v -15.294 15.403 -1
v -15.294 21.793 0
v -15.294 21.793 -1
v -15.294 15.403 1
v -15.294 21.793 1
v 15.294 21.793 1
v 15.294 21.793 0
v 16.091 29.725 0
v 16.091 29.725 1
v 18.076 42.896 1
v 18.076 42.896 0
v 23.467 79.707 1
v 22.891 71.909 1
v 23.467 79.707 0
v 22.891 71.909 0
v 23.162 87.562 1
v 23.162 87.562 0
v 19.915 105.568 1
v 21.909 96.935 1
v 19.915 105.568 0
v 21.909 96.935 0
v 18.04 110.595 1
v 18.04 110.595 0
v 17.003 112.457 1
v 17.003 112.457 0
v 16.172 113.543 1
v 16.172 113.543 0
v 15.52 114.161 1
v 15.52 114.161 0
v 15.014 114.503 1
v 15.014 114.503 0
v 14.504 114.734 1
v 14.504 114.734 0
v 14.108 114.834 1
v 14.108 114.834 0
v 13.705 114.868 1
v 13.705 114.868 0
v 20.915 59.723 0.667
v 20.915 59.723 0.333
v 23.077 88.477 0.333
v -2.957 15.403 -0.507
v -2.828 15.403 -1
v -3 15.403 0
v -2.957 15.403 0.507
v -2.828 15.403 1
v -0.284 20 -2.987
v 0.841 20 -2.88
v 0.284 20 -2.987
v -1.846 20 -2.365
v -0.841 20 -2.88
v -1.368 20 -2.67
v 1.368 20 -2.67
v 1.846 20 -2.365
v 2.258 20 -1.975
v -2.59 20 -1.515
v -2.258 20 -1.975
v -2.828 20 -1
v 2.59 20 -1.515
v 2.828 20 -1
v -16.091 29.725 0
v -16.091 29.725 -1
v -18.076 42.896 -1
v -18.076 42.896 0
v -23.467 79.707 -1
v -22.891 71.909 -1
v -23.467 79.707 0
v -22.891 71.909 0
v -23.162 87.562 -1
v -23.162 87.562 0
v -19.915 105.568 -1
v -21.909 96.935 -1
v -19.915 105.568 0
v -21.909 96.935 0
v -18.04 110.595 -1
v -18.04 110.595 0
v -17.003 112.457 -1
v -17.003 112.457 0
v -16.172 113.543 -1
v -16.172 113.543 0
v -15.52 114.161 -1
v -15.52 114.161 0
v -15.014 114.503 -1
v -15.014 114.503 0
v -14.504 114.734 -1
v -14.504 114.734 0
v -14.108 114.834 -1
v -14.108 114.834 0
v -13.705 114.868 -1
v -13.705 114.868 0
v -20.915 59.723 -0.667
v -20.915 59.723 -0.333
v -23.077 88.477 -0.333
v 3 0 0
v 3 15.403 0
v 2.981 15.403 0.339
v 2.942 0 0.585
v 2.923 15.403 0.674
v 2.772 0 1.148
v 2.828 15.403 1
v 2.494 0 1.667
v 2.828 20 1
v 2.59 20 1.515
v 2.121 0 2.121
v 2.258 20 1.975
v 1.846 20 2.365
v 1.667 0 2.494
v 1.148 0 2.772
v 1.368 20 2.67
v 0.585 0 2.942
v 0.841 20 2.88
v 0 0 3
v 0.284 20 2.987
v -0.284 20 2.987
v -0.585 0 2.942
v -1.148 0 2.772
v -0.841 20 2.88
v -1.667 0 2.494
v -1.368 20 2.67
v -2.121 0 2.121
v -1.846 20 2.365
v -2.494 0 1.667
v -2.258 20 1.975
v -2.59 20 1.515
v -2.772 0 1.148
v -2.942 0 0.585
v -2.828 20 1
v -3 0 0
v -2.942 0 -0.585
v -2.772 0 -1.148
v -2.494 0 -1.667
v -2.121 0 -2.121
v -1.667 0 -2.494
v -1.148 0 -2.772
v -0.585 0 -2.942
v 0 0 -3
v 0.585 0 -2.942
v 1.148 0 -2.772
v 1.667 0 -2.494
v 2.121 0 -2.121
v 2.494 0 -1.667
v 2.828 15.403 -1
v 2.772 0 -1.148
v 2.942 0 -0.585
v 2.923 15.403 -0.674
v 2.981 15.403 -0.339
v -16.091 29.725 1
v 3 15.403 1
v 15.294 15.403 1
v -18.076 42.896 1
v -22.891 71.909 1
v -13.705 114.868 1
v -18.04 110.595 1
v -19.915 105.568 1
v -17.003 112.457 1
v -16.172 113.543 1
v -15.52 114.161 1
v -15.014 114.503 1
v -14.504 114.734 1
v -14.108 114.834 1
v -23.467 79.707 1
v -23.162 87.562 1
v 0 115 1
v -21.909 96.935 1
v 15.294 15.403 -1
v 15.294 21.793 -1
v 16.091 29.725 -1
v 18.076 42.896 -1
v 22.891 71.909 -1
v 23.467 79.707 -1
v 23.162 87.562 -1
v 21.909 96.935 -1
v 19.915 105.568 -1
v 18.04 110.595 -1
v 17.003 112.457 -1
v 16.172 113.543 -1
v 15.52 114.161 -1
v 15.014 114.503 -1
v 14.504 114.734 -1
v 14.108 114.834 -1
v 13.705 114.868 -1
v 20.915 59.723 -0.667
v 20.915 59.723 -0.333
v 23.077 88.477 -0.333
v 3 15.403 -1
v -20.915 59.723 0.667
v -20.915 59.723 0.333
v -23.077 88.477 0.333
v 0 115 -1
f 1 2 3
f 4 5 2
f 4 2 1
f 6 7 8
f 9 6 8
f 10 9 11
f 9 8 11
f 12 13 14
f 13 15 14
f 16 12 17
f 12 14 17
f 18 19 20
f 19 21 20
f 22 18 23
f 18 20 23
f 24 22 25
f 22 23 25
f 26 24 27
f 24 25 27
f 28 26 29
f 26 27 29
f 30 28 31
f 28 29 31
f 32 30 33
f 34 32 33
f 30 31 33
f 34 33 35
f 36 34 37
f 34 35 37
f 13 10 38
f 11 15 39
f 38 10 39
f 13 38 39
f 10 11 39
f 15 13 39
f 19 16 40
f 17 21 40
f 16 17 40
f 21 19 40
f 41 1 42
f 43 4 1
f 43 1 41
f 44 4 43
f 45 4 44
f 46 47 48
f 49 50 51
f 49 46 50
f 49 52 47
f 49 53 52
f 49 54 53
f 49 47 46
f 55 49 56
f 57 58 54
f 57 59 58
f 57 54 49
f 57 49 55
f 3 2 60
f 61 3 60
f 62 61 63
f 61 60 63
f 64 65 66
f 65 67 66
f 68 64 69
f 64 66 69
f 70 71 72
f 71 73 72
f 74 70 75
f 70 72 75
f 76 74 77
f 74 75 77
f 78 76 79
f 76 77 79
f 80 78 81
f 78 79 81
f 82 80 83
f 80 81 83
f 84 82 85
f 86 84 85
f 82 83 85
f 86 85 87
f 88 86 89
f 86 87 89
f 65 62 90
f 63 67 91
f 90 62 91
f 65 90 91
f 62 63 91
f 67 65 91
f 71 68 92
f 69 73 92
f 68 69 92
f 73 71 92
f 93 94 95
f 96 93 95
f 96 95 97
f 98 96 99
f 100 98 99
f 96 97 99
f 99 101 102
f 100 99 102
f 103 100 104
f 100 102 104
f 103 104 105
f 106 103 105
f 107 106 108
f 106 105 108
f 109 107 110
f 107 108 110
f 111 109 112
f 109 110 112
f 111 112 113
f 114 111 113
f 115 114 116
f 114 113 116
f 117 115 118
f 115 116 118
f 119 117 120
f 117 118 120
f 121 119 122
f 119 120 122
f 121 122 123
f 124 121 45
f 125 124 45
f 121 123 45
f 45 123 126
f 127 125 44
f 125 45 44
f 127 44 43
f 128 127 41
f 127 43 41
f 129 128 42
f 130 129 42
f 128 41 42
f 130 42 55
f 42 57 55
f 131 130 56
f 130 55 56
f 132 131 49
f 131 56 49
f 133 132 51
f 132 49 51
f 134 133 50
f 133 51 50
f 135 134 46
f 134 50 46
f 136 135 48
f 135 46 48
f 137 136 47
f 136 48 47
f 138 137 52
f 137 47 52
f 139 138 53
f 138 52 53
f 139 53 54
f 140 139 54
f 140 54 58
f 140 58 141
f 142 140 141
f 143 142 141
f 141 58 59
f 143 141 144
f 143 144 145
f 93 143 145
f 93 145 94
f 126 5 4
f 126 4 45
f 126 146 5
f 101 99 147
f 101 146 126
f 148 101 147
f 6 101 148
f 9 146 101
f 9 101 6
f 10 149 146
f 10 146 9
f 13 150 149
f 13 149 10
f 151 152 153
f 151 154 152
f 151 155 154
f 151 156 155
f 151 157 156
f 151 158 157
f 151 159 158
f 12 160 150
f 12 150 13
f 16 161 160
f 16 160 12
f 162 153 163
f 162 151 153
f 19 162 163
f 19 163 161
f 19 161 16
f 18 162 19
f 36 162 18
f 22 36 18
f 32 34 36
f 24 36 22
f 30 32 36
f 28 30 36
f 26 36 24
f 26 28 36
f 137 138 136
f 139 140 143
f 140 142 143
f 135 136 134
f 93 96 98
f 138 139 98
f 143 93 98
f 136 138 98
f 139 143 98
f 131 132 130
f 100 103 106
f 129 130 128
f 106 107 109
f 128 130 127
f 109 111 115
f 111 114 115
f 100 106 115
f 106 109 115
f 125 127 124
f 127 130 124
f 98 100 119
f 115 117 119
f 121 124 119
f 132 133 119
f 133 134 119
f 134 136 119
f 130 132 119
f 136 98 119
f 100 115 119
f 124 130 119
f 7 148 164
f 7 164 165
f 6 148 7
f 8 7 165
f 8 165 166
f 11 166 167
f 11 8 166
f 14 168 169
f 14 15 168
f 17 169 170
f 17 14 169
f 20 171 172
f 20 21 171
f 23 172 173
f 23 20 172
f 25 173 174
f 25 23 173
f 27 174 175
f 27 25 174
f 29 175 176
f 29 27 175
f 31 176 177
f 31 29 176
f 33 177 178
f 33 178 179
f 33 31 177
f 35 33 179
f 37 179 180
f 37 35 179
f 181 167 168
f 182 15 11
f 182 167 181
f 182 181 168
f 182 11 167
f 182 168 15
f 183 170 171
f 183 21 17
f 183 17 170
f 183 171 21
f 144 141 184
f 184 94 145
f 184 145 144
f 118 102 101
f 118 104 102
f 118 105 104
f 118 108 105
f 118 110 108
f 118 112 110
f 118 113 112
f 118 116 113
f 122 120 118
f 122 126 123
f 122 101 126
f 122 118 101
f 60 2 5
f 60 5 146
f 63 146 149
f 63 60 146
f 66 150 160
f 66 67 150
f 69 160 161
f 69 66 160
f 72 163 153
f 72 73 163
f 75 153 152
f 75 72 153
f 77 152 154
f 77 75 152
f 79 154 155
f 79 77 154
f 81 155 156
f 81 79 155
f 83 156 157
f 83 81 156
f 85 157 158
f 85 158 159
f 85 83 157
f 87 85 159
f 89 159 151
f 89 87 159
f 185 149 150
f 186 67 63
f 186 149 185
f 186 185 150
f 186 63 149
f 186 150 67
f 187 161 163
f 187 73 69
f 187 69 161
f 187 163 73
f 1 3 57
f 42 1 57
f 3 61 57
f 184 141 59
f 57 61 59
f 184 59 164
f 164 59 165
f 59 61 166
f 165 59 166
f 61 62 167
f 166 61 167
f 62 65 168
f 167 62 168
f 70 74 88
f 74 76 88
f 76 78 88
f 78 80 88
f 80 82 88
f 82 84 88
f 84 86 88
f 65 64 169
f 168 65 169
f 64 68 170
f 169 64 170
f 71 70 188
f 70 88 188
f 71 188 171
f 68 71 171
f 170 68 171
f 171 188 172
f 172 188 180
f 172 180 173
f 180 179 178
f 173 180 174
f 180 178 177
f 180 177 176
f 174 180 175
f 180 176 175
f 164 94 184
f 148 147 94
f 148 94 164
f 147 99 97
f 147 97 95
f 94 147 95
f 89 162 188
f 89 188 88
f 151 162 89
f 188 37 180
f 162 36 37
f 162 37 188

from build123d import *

# Parameters (mm, degrees)
F0_W     = 3
F0_H     = 4.5972731709
F0_H_2   = 15.4027268291
F2_DEPTH = 1


with BuildPart() as f1:
    # F0 (on Top) → F1 (revolve)
    with BuildSketch(Plane.XY):
        with Locations((1.5, 17.7013634145)):
            Rectangle(F0_W, F0_H)
        with Locations((1.5, 7.7013634145)):
            Rectangle(F0_W, F0_H_2)
    revolve(axis=Axis((0, 10, 0), (0, -1, 0)))

    # F0 (on Top) → F2 (join, symmetric)
    with BuildSketch(Plane.XY):
        with BuildLine():
            Line((-15.293511562, 15.4027268291), (0, 15.4027268291))
            Line((0, 15.4027268291), (0, 20))
            Line((0, 20), (3, 20))
            Line((3, 20), (3, 15.4027268291))
            Line((3, 15.4027268291), (15.293511562, 15.4027268291))
            Line((15.293511562, 15.4027268291), (15.293511562, 21.7934865505))
            add(Edge.make_bspline(
                [(15.293511562, 21.7934865505), (15.3114958093, 26.6520165048), (21.4737595411, 63.8554104581), (25.3872782552, 83.6366472522), (18.6823600411, 114.8716425409), (13.7054072693, 114.8677670956)],
                knots=[0, 0, 0, 0, 0.3674025375, 0.686010727, 1, 1, 1, 1], degree=3))
            Line((13.7054072693, 114.8677670956), (0, 115))
            Line((0, 115), (-13.7054072693, 114.8677670956))
            add(Edge.make_bspline(
                [(-15.293511562, 21.7934865505), (-15.3114958093, 26.6520165048), (-21.4737595411, 63.8554104581), (-25.3872782552, 83.6366472522), (-18.6823600411, 114.8716425409), (-13.7054072693, 114.8677670956)],
                knots=[0, 0, 0, 0, 0.3674025375, 0.686010727, 1, 1, 1, 1], degree=3))
            Line((-15.293511562, 21.7934865505), (-15.293511562, 15.4027268291))
        make_face()
        with Locations((1.5, 17.7013634145)):
            Rectangle(F0_W, F0_H)
    extrude(amount=F2_DEPTH, both=True)


solid = f1.part
